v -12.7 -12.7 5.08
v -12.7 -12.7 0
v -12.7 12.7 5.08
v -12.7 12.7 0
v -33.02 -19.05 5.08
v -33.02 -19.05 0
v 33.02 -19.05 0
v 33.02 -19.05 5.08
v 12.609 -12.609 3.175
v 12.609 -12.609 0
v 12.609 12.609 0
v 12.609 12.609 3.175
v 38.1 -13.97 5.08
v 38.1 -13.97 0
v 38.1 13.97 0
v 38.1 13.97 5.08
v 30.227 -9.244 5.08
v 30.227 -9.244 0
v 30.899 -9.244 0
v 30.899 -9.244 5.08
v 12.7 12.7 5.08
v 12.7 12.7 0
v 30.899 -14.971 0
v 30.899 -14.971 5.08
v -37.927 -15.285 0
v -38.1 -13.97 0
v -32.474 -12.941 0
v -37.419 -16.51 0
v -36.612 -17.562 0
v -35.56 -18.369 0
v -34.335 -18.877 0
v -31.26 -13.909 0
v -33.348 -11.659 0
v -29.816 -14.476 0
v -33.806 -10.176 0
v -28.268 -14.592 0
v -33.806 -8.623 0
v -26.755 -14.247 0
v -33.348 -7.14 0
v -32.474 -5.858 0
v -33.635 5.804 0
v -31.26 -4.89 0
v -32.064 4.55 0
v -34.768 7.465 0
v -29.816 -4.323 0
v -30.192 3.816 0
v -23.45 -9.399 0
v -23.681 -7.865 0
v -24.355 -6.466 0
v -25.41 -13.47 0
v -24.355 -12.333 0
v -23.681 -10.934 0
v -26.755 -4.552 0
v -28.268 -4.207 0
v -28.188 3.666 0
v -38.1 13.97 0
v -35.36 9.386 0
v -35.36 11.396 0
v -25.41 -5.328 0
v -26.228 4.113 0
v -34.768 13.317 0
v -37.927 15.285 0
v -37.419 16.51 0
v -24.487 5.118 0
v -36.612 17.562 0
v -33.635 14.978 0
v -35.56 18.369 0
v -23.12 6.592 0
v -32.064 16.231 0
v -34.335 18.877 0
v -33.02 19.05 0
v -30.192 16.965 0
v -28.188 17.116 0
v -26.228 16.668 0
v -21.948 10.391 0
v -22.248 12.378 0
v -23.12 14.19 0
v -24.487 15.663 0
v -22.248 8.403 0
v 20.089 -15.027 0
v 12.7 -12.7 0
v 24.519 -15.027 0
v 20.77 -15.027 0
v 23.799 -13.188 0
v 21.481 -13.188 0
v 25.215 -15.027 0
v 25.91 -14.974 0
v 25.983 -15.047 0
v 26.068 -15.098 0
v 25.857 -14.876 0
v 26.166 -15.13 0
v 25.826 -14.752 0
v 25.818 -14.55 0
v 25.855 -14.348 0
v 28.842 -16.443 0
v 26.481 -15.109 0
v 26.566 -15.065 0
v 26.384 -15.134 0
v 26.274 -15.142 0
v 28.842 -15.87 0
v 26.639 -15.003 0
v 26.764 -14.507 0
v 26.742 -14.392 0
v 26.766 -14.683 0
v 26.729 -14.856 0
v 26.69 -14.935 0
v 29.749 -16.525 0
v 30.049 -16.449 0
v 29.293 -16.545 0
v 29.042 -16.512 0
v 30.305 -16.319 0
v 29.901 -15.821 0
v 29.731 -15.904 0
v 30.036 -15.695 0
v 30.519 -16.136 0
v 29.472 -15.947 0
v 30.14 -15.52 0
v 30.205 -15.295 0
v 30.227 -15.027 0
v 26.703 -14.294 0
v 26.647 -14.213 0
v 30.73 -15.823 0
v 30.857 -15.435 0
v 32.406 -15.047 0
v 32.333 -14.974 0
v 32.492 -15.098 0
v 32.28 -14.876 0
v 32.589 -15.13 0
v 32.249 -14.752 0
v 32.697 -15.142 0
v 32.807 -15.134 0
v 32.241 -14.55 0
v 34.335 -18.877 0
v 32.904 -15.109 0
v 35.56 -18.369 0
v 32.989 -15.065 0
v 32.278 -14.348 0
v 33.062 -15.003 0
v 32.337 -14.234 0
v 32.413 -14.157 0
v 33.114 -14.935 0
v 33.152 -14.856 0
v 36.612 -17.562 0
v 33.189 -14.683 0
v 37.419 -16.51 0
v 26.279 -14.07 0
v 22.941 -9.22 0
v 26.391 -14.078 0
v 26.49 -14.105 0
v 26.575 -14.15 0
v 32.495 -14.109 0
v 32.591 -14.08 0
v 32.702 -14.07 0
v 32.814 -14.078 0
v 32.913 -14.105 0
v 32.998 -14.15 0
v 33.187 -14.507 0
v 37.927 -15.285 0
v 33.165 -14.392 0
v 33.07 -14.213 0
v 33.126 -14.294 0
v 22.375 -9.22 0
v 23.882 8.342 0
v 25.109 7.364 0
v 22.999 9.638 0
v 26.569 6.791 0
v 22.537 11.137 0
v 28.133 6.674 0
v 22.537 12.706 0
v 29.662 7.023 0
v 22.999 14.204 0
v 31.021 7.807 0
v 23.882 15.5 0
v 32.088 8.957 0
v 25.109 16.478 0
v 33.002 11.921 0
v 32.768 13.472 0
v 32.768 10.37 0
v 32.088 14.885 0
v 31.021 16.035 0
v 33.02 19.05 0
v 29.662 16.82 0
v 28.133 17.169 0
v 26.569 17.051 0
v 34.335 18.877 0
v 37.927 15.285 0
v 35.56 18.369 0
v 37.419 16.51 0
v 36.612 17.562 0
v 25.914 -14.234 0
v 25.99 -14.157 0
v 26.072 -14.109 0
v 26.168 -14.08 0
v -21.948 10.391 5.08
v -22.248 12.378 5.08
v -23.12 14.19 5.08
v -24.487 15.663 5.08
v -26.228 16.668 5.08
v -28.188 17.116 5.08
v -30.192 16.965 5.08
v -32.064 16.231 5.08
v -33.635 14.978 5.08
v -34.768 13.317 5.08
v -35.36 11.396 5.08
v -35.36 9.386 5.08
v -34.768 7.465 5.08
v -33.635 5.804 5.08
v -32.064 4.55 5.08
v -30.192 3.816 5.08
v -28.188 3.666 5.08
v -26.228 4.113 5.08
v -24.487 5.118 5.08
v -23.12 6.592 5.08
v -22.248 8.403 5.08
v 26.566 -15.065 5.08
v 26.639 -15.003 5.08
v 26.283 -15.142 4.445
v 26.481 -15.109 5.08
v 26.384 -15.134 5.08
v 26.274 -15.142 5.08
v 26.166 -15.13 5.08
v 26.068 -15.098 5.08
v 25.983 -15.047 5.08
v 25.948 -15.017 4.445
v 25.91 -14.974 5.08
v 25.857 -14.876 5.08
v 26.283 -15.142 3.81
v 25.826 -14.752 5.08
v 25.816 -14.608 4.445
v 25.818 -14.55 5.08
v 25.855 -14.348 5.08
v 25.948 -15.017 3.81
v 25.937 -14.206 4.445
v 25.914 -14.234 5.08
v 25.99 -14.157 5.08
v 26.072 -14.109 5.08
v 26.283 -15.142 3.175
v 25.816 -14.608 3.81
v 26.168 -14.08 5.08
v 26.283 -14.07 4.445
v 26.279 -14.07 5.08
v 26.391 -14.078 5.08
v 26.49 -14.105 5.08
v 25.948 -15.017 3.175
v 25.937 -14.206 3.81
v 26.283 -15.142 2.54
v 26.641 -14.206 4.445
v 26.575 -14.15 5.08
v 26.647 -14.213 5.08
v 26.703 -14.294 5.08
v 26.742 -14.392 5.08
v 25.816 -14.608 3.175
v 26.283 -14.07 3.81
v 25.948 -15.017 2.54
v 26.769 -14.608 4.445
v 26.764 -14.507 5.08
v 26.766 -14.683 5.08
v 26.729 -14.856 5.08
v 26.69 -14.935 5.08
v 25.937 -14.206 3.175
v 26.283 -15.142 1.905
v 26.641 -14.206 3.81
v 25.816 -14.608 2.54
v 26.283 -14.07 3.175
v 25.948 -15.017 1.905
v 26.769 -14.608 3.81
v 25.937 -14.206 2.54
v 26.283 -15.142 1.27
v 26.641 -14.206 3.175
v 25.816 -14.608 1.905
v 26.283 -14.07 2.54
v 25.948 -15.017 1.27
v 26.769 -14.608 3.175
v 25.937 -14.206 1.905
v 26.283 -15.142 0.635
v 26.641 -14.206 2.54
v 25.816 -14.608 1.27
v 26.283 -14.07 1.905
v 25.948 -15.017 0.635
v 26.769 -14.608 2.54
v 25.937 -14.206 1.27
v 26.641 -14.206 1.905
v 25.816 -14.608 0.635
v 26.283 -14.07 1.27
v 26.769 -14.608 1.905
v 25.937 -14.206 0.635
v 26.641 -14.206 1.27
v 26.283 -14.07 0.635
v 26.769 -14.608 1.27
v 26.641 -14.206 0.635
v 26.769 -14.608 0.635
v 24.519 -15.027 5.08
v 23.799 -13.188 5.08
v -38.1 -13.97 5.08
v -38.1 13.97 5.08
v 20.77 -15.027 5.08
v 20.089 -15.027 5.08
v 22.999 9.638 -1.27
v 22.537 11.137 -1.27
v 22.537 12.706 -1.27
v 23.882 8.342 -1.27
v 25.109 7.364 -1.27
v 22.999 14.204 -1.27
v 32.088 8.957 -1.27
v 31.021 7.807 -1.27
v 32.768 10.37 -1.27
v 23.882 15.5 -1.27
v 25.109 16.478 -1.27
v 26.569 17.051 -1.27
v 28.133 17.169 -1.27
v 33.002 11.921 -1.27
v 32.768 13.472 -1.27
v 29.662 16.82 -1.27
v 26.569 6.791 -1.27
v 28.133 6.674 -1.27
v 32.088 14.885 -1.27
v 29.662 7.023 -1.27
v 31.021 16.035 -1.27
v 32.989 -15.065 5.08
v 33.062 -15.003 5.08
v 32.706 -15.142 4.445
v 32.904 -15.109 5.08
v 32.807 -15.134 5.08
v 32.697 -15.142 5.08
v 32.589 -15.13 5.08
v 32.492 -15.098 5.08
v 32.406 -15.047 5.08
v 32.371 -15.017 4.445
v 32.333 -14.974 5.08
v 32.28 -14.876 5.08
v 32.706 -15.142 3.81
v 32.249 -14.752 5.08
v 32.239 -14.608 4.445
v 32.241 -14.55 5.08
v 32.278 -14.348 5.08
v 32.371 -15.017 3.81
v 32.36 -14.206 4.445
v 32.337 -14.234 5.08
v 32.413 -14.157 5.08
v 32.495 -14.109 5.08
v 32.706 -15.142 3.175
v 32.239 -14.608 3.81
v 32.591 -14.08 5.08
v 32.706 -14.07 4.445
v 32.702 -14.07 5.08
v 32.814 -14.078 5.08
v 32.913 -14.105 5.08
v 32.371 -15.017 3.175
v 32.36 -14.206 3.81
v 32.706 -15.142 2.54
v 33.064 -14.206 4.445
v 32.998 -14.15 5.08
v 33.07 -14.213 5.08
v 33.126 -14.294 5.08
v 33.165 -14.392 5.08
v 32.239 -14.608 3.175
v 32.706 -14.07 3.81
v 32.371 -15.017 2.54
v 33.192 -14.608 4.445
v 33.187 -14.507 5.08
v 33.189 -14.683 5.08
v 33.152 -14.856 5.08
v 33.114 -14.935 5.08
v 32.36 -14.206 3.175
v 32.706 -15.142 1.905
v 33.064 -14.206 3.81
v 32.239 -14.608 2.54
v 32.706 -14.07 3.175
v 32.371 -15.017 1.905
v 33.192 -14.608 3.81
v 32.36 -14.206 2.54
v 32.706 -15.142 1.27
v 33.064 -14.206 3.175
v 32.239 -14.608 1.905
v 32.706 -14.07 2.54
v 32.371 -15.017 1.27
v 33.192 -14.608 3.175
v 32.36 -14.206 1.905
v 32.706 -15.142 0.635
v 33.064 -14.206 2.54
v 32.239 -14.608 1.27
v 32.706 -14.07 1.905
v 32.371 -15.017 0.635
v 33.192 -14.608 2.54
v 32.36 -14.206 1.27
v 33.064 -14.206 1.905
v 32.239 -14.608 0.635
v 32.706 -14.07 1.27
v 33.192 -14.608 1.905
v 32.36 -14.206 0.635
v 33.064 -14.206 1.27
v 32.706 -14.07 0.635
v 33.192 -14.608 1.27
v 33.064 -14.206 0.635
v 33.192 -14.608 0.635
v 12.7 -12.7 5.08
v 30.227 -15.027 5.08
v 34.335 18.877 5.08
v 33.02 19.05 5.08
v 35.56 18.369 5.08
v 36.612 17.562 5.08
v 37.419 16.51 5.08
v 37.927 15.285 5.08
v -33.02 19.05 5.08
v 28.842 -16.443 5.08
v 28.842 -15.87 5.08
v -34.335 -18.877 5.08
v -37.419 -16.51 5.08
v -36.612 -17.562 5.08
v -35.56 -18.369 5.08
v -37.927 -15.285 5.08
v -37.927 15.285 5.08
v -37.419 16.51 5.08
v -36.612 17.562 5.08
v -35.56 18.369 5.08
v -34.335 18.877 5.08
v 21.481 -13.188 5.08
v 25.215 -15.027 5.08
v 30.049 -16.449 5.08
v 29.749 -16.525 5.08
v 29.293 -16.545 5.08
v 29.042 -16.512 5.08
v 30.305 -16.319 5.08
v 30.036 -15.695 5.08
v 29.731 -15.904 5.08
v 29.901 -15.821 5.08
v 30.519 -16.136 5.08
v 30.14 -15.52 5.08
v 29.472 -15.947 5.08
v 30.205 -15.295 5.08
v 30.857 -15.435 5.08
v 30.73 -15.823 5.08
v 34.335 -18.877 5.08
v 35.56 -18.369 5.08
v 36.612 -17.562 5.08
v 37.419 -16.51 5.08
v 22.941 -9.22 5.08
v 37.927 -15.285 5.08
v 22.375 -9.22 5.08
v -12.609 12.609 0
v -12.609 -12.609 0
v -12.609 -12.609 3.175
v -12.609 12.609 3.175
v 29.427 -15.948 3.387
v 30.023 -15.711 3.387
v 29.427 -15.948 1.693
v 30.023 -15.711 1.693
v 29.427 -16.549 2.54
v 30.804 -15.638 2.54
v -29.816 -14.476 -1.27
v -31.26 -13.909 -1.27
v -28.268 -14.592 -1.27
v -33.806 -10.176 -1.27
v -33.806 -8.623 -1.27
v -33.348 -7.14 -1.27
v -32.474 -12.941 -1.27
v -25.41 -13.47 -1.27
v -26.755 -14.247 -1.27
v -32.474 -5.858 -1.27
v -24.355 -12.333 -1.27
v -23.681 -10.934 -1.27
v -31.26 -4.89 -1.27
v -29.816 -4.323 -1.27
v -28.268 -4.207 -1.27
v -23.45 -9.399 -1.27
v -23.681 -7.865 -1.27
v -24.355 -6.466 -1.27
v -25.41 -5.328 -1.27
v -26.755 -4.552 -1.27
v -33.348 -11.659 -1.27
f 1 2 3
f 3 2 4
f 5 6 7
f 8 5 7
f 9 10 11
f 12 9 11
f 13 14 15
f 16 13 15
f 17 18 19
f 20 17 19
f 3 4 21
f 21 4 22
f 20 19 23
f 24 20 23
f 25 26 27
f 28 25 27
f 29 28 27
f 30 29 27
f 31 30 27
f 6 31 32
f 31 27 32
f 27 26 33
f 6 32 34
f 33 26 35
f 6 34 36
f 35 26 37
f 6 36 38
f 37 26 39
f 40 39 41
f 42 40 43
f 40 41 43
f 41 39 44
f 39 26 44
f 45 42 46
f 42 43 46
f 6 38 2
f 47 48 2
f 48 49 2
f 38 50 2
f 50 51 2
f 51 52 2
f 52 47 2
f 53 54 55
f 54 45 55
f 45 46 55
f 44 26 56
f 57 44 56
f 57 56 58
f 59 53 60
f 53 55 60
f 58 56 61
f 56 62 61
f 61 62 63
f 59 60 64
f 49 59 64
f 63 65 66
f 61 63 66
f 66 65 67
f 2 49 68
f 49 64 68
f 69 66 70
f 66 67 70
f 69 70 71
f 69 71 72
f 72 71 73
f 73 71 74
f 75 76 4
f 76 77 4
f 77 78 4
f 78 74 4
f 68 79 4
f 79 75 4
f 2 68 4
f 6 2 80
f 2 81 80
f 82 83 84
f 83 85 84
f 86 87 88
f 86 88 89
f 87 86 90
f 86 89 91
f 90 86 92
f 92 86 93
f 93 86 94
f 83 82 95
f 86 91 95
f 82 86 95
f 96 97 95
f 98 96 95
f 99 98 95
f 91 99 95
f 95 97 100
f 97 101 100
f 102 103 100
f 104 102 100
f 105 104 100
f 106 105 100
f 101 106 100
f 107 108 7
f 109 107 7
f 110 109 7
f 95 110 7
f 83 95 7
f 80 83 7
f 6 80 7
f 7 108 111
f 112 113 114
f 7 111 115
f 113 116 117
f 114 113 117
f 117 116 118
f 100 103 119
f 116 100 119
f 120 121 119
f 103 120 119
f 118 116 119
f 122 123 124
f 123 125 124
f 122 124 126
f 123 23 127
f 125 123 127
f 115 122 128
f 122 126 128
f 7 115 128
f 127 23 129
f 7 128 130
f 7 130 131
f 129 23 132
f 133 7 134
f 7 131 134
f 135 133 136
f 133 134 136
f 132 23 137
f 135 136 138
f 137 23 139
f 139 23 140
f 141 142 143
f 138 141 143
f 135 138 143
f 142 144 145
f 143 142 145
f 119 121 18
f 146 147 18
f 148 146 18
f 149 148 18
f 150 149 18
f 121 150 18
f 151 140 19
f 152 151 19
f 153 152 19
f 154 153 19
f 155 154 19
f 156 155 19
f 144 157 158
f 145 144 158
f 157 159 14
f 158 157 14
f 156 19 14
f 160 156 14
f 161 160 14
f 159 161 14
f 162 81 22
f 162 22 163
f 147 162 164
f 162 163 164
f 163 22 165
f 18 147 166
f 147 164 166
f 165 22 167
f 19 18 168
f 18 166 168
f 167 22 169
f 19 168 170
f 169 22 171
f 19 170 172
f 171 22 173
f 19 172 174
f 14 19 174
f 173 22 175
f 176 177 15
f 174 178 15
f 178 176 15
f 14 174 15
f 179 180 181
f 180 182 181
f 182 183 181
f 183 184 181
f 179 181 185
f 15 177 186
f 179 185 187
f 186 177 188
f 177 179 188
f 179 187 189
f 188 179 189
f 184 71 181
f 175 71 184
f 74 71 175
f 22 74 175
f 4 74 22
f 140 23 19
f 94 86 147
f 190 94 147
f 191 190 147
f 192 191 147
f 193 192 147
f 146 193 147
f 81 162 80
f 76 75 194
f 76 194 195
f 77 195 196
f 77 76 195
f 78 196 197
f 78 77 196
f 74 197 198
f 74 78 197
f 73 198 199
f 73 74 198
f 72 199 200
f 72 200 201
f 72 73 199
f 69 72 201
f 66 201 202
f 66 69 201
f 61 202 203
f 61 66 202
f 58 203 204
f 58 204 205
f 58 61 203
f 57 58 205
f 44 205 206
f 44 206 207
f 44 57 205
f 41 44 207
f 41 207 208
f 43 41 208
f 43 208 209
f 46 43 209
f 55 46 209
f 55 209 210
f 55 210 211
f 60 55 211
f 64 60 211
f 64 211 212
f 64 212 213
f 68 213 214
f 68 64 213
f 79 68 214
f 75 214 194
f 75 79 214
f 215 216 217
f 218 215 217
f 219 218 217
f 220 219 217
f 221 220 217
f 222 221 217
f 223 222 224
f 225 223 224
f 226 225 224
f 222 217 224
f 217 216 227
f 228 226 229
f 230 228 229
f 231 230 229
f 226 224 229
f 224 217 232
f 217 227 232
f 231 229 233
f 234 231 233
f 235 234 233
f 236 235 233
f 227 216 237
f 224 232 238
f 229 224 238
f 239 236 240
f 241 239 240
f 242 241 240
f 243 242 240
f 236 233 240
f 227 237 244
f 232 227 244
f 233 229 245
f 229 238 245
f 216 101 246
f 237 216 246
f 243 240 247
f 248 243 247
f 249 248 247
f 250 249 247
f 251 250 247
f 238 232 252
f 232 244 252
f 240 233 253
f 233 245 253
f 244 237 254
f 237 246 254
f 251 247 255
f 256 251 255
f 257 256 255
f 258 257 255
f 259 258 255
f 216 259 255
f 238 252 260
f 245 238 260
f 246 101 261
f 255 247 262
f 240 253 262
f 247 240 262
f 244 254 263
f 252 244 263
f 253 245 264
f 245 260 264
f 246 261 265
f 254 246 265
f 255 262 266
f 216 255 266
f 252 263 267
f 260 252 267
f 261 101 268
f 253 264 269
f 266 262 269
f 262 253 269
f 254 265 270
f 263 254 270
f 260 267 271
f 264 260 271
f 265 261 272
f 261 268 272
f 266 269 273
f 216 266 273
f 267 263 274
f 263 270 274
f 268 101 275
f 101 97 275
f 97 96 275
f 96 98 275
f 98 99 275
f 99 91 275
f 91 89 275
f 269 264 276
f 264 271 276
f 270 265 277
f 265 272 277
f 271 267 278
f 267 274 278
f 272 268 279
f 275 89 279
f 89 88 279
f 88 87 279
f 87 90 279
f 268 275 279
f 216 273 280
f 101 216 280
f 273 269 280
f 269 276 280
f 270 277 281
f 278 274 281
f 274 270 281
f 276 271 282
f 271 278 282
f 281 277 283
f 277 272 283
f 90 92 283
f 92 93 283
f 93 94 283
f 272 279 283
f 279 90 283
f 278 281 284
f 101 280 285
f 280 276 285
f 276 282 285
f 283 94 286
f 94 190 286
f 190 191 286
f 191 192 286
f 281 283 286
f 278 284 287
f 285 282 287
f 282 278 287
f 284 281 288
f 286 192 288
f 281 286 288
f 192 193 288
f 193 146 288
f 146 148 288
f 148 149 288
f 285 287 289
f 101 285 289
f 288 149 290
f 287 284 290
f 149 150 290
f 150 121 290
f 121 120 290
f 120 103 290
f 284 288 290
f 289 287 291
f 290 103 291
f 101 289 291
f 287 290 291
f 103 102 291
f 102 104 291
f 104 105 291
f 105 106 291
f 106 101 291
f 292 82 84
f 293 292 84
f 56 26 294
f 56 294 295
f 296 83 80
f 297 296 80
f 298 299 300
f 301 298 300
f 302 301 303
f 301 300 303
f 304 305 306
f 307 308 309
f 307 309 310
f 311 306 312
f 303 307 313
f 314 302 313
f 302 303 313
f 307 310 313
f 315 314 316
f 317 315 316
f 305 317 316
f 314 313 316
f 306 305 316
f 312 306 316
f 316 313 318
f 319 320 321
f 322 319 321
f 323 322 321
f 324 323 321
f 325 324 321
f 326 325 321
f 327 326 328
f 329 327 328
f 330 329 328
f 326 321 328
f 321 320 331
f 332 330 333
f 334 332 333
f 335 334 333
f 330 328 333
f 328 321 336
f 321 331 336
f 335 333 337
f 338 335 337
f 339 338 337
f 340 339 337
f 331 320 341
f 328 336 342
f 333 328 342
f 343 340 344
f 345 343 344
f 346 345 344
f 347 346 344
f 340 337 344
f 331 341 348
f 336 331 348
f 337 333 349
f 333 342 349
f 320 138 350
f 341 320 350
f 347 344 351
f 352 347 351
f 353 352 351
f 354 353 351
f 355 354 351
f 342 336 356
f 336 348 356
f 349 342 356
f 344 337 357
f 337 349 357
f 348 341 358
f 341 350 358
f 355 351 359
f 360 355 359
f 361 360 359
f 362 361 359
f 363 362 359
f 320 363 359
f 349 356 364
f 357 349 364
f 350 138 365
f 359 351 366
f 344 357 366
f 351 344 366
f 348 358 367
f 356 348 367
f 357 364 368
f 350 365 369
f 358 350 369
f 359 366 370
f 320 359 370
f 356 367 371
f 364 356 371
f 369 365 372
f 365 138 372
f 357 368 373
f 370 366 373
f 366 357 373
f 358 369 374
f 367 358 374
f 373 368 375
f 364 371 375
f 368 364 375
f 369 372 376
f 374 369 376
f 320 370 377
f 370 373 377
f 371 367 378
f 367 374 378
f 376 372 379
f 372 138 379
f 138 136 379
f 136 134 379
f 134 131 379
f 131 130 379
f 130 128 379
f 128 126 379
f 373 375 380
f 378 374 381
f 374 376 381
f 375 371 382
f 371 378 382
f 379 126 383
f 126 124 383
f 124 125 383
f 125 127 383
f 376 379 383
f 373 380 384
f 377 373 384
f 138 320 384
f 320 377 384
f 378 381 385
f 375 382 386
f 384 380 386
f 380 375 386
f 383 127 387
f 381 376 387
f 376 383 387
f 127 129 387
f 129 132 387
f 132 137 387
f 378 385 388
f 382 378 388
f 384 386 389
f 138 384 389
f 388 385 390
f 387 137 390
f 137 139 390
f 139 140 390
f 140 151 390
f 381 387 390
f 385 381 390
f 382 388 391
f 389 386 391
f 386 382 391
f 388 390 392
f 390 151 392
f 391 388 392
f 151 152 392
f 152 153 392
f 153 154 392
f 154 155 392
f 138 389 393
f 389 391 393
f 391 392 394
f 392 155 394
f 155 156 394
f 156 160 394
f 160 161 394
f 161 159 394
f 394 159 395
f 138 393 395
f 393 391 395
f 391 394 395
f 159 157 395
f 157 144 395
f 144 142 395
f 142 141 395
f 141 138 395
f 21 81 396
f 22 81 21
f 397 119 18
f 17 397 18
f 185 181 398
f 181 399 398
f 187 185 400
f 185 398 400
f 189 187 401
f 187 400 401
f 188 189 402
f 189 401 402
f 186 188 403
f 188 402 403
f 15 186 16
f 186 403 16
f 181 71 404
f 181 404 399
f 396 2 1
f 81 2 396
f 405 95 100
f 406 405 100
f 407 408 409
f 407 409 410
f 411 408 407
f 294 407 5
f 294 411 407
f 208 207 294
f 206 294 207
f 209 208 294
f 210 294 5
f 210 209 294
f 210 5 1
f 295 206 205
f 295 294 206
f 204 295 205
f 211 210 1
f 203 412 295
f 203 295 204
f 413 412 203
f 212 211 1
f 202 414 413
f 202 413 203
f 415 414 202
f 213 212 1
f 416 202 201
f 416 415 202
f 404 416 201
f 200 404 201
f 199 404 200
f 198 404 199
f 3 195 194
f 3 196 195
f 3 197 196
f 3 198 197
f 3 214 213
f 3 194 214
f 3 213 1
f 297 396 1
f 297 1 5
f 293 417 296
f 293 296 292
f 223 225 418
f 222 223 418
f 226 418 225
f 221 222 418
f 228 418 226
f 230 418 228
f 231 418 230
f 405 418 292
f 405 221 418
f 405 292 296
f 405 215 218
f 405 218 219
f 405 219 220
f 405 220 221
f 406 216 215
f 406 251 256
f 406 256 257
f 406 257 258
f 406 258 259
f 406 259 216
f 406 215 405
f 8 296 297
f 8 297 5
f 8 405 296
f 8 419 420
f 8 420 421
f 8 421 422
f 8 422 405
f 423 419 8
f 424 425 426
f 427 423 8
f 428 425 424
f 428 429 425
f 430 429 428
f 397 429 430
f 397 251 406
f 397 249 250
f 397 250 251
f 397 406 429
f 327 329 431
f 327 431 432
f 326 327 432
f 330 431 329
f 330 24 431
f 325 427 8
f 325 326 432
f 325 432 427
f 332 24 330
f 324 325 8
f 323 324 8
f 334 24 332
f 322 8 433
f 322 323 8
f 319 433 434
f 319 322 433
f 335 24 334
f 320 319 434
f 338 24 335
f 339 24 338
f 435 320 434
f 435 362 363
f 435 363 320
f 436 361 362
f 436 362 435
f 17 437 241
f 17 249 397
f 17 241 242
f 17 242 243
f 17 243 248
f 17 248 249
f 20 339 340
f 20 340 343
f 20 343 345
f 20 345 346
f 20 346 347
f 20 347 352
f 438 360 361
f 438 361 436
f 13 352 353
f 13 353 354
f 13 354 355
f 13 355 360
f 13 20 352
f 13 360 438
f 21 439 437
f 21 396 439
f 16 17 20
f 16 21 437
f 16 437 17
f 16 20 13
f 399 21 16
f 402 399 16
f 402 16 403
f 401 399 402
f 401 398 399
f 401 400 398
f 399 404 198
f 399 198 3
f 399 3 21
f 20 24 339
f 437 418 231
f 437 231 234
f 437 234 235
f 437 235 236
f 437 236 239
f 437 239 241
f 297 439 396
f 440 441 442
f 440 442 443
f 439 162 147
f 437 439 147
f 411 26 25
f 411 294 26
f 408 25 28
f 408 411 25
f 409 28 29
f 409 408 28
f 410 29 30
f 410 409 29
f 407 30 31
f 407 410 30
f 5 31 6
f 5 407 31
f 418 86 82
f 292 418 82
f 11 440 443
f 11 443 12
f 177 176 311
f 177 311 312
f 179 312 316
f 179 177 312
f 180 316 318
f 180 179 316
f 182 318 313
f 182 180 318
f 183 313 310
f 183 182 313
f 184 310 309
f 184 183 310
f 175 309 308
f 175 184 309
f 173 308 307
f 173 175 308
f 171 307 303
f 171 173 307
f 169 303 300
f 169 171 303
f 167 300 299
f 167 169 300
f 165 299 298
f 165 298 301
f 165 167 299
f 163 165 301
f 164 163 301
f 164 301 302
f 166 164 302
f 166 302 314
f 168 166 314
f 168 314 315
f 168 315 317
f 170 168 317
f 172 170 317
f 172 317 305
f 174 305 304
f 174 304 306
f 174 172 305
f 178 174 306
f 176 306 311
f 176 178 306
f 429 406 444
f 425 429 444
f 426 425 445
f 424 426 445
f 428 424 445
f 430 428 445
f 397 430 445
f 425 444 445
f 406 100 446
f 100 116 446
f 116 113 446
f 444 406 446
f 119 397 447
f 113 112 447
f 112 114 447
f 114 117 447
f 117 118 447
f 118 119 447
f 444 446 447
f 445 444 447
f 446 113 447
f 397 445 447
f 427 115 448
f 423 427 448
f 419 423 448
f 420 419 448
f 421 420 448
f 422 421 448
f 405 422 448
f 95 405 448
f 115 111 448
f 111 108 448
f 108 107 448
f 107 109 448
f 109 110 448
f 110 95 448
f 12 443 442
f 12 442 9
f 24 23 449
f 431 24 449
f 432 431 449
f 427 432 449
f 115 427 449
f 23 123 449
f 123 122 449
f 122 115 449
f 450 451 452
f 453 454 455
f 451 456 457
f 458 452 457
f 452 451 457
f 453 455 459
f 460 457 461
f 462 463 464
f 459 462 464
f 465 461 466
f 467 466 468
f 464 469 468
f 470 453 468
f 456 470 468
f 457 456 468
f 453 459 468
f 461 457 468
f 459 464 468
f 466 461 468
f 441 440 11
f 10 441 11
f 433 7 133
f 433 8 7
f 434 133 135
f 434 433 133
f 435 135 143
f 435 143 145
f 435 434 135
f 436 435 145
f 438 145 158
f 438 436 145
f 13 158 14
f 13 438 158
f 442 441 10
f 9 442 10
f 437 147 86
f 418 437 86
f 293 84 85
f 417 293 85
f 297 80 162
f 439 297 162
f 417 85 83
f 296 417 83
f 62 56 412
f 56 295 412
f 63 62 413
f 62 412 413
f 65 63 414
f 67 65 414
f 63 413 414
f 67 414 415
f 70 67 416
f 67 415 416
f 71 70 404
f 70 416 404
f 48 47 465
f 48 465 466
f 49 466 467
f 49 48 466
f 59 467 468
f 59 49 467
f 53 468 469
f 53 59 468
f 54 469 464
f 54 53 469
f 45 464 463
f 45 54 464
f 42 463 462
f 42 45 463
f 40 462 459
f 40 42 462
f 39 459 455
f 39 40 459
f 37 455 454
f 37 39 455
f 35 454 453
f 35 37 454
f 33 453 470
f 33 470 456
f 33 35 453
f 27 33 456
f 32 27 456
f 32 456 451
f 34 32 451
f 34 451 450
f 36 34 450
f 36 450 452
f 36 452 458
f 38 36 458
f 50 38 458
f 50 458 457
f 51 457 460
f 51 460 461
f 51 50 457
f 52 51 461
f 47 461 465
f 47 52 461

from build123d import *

# Parameters (mm, degrees)
F0_W      = 76.2
F0_H      = 38.1
F0_R      = 6.7437751626
F0_W_2    = 25.4
F0_H_2    = 25.4
F1_DEPTH  = 5.08
F2_W      = 23.8145831972
F2_H      = 23.7880713142
F3_DEPTH  = 6.35
F5_W      = 25.2180509269
F5_H      = 25.2180509269
F6_DEPTH  = 3.175
F7_R      = 5.2620849858
F8_DEPTH  = 1.27
F9_R      = 5.207
F10_DEPTH = 1.27
F11_R     = 5.08


with BuildPart() as f1:
    # F0 (on Top) → F1 (new body)
    with BuildSketch(Plane.XY):
        Rectangle(F0_W, F0_H)
        with BuildLine():
            add(Edge.make_bspline(
                [(25.9483247947, -15.0171730814), (25.816066651, -14.8925087067), (25.816066651, -14.6077423686)],
                knots=[0, 0, 0, 1, 1, 1], degree=2))
            add(Edge.make_bspline(
                [(25.816066651, -14.6077423686), (25.816066651, -14.3419604529), (25.9369341412, -14.2059054247)],
                knots=[0, 0, 0, 1, 1, 1], degree=2))
            add(Edge.make_bspline(
                [(25.9369341412, -14.2059054247), (26.0578016314, -14.0698503965), (26.2830834456, -14.0698503965)],
                knots=[0, 0, 0, 1, 1, 1], degree=2))
            add(Edge.make_bspline(
                [(26.2830834456, -14.0698503965), (26.5121621443, -14.0698503965), (26.6406234035, -14.2059054247)],
                knots=[0, 0, 0, 1, 1, 1], degree=2))
            add(Edge.make_bspline(
                [(26.6406234035, -14.2059054247), (26.7690846627, -14.3419604529), (26.7690846627, -14.6077423686)],
                knots=[0, 0, 0, 1, 1, 1], degree=2))
            add(Edge.make_bspline(
                [(26.7690846627, -14.6077423686), (26.7690846627, -14.864664887), (26.6387249612, -15.0032511715)],
                knots=[0, 0, 0, 1, 1, 1], degree=2))
            add(Edge.make_bspline(
                [(26.6387249612, -15.0032511715), (26.5083652598, -15.1418374561), (26.2830834456, -15.1418374561)],
                knots=[0, 0, 0, 1, 1, 1], degree=2))
            add(Edge.make_bspline(
                [(26.2830834456, -15.1418374561), (26.0805829384, -15.1418374561), (25.9483247947, -15.0171730814)],
                knots=[0, 0, 0, 1, 1, 1], degree=2))
        make_face(mode=Mode.SUBTRACT)
        with BuildLine():
            add(Edge.make_bspline(
                [(32.3713877553, -15.0171730814), (32.2391296116, -14.8925087067), (32.2391296116, -14.6077423686)],
                knots=[0, 0, 0, 1, 1, 1], degree=2))
            add(Edge.make_bspline(
                [(32.2391296116, -14.6077423686), (32.2391296116, -14.3419604529), (32.3599971018, -14.2059054247)],
                knots=[0, 0, 0, 1, 1, 1], degree=2))
            add(Edge.make_bspline(
                [(32.3599971018, -14.2059054247), (32.480864592, -14.0698503965), (32.7061464062, -14.0698503965)],
                knots=[0, 0, 0, 1, 1, 1], degree=2))
            add(Edge.make_bspline(
                [(32.7061464062, -14.0698503965), (32.9352251049, -14.0698503965), (33.0636863641, -14.2059054247)],
                knots=[0, 0, 0, 1, 1, 1], degree=2))
            add(Edge.make_bspline(
                [(33.0636863641, -14.2059054247), (33.1921476233, -14.3419604529), (33.1921476233, -14.6077423686)],
                knots=[0, 0, 0, 1, 1, 1], degree=2))
            add(Edge.make_bspline(
                [(33.1921476233, -14.6077423686), (33.1921476233, -14.864664887), (33.0617879218, -15.0032511715)],
                knots=[0, 0, 0, 1, 1, 1], degree=2))
            add(Edge.make_bspline(
                [(33.0617879218, -15.0032511715), (32.9314282204, -15.1418374561), (32.7061464062, -15.1418374561)],
                knots=[0, 0, 0, 1, 1, 1], degree=2))
            add(Edge.make_bspline(
                [(32.7061464062, -15.1418374561), (32.503645899, -15.1418374561), (32.3713877553, -15.0171730814)],
                knots=[0, 0, 0, 1, 1, 1], degree=2))
        make_face(mode=Mode.SUBTRACT)
        Polygon((25.2148932705, -15.0266652927), (24.5187977772, -15.0266652927), (23.7986553487, -13.1877075623), (21.4812901702, -13.1877075623), (20.7700071389, -15.0266652927), (20.0890991837, -15.0266652927), (22.3748236579, -9.2199632507), (22.9405594497, -9.2199632507), align=None, mode=Mode.SUBTRACT)
        with BuildLine():
            add(Edge.make_bspline(
                [(30.5191409291, -16.1359883833), (30.1394524783, -16.5492159807), (29.4269038188, -16.5492159807)],
                knots=[0, 0, 0, 1, 1, 1], degree=2))
            add(Edge.make_bspline(
                [(29.4269038188, -16.5492159807), (29.0560747651, -16.5492159807), (28.8421836045, -16.4429032144)],
                knots=[0, 0, 0, 1, 1, 1], degree=2))
            Line((28.8421836045, -16.4429032144), (28.8421836045, -15.8695736536))
            add(Edge.make_bspline(
                [(28.8421836045, -15.8695736536), (29.1231530581, -15.9480426001), (29.4269038188, -15.9480426001)],
                knots=[0, 0, 0, 1, 1, 1], degree=2))
            add(Edge.make_bspline(
                [(29.4269038188, -15.9480426001), (29.8192485514, -15.9480426001), (30.0230146867, -15.7107373183)],
                knots=[0, 0, 0, 1, 1, 1], degree=2))
            add(Edge.make_bspline(
                [(30.0230146867, -15.7107373183), (30.226780822, -15.4734320365), (30.226780822, -15.0266652927)],
                knots=[0, 0, 0, 1, 1, 1], degree=2))
            Line((30.226780822, -15.0266652927), (30.226780822, -9.2440101859))
            Line((30.226780822, -9.2440101859), (30.89882938, -9.2440101859))
            Line((30.89882938, -9.2440101859), (30.89882938, -14.9709776532))
            add(Edge.make_bspline(
                [(30.89882938, -14.9709776532), (30.89882938, -15.7227607859), (30.5191409291, -16.1359883833)],
                knots=[0, 0, 0, 1, 1, 1], degree=2))
        make_face(mode=Mode.SUBTRACT)
        with Locations((-28.6917921776, 10.3906594306)):
            Circle(F0_R, mode=Mode.SUBTRACT)
        Rectangle(F0_W_2, F0_H_2, mode=Mode.SUBTRACT)
    extrude(amount=F1_DEPTH)

    # F7 (on Top) → F8 (join)
    with BuildSketch(Plane.XY):
        with Locations((27.7398545295, 11.9212605059)):
            Circle(F7_R)
    extrude(amount=-F8_DEPTH)

    # F9 (on Top) → F10 (join)
    with BuildSketch(Plane.XY):
        with Locations((-28.6568775773, -9.399455972)):
            Circle(F9_R)
    extrude(amount=-F10_DEPTH)

    # F11
    f11_edges = [f1.edges().sort_by_distance(p)[0] for p in [
        (38.1, 19.05, 2.54),
        (38.1, -19.05, 2.54),
        (-38.1, -19.05, 2.54),
        (-38.1, 19.05, 2.54),
    ]]
    fillet(f11_edges, radius=F11_R)


with BuildPart() as f3:
    # F2 (on Top) → F3 (new body)
    with BuildSketch(Plane.XY):
        Rectangle(F2_W, F2_H)
    extrude(amount=F3_DEPTH)


with BuildPart() as f6:
    # F5 (on Top) → F6 (new body)
    with BuildSketch(Plane.XY):
        Rectangle(F5_W, F5_H)
    extrude(amount=F6_DEPTH)


solid = Compound([f1.part, f6.part])
